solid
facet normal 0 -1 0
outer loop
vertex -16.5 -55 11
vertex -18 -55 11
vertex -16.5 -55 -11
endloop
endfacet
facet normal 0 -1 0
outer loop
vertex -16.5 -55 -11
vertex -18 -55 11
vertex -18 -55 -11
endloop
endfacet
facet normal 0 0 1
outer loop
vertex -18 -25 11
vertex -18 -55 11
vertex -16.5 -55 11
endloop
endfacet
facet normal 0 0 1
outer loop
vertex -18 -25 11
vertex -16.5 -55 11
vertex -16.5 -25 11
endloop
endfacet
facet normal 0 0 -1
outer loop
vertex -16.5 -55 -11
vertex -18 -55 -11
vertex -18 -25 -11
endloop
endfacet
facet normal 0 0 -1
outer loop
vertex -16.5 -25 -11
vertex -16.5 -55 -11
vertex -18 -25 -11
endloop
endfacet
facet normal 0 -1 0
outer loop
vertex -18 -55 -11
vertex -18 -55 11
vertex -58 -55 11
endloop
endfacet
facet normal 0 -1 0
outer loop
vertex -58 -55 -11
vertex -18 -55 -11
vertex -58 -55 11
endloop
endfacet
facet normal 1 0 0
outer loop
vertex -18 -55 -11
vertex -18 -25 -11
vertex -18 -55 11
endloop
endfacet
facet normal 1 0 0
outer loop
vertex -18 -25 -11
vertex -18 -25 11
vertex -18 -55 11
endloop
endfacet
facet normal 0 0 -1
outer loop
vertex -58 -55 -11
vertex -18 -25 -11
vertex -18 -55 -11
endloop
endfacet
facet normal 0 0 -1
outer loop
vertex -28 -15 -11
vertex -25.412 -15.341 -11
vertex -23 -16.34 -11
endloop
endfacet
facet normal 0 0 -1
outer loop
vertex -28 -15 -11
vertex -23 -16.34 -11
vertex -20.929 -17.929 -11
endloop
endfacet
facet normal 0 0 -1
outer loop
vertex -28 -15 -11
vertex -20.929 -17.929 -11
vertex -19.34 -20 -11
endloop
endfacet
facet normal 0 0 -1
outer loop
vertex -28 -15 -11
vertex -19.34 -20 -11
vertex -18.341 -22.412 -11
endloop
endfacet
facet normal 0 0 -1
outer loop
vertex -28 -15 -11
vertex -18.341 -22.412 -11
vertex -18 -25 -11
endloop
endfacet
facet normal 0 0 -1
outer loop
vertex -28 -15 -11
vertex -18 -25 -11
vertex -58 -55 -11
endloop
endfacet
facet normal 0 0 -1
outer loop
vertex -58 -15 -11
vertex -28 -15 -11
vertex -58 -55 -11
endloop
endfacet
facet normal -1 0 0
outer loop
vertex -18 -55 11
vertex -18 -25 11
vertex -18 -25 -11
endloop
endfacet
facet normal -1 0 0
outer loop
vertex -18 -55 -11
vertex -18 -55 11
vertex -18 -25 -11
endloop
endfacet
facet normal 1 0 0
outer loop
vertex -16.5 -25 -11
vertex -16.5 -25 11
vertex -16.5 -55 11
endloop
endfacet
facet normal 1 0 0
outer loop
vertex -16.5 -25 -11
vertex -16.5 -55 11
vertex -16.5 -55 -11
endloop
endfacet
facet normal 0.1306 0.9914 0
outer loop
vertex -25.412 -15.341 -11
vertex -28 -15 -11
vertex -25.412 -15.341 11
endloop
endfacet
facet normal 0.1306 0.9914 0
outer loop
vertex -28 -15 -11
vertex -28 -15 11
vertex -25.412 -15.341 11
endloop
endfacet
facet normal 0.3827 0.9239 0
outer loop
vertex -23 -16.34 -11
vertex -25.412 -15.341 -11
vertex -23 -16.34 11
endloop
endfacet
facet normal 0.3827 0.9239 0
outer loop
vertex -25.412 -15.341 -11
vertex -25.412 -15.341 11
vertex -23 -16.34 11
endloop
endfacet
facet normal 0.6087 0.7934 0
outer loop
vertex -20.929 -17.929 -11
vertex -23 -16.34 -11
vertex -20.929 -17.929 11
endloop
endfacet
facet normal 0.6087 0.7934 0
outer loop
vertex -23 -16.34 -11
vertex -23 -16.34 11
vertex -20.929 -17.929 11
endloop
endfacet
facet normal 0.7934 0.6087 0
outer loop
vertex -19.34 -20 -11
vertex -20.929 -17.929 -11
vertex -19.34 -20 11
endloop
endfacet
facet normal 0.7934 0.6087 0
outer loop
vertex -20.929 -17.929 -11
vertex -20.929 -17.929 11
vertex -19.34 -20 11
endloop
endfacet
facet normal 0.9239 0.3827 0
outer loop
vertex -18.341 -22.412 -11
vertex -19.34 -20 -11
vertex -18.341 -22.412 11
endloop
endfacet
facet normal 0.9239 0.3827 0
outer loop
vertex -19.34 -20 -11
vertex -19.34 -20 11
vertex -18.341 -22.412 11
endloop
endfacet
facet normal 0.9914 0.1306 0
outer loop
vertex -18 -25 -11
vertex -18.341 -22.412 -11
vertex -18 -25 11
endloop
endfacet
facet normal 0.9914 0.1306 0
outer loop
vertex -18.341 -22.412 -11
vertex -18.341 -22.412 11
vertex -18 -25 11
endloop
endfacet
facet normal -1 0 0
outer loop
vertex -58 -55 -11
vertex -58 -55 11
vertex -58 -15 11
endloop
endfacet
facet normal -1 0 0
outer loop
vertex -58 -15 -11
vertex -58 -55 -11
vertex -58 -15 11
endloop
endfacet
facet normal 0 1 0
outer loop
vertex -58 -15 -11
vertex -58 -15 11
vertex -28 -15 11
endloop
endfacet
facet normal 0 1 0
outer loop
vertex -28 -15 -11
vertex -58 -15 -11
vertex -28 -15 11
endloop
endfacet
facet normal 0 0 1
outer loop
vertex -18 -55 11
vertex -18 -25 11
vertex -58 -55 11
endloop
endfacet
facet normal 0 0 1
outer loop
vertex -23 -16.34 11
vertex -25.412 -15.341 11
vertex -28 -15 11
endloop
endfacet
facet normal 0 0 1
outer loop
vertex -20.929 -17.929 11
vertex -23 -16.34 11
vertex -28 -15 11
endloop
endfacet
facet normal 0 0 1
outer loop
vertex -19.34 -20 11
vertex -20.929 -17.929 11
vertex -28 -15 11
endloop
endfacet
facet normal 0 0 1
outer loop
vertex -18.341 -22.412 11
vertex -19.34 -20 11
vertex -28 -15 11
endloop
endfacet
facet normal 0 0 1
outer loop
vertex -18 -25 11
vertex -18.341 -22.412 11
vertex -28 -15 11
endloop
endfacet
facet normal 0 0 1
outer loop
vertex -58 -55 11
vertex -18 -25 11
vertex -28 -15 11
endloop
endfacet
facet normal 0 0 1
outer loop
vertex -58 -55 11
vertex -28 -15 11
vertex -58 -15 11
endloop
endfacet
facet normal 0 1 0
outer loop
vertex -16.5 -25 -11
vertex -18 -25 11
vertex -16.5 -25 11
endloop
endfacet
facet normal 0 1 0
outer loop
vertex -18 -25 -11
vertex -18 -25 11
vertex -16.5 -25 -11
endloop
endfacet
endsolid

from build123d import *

# Parameters (mm, degrees)
BOSS_EXTRU_1_DEPTH = 11
ESQUISSE2_W        = 22
ESQUISSE2_H        = 30
BOSS_EXTRU_2_DEPTH = 1.5


with BuildPart() as part:
    # Esquisse1 → Boss.-Extru.1 (new, symmetric)
    with BuildSketch(Plane.XY):
        with BuildLine():
            Line((-58, -15), (-28, -15))
            ThreePointArc((-28, -15), (-20.928932188, -17.928932188), (-18, -25))
            Line((-18, -25), (-18, -55))
            Line((-18, -55), (-58, -55))
            Line((-58, -55), (-58, -15))
        make_face()
    extrude(amount=BOSS_EXTRU_1_DEPTH, both=True)


with BuildPart() as body_2:
    # Esquisse2 → Boss.-Extru.2 (new body)
    with BuildSketch(Plane(origin=(-18, 0, 0), x_dir=(0, 0, -1), z_dir=(1, 0, 0))):
        with Locations((0, -40)):
            Rectangle(ESQUISSE2_W, ESQUISSE2_H)
    extrude(amount=BOSS_EXTRU_2_DEPTH)


solid = Compound([part.part, body_2.part])
